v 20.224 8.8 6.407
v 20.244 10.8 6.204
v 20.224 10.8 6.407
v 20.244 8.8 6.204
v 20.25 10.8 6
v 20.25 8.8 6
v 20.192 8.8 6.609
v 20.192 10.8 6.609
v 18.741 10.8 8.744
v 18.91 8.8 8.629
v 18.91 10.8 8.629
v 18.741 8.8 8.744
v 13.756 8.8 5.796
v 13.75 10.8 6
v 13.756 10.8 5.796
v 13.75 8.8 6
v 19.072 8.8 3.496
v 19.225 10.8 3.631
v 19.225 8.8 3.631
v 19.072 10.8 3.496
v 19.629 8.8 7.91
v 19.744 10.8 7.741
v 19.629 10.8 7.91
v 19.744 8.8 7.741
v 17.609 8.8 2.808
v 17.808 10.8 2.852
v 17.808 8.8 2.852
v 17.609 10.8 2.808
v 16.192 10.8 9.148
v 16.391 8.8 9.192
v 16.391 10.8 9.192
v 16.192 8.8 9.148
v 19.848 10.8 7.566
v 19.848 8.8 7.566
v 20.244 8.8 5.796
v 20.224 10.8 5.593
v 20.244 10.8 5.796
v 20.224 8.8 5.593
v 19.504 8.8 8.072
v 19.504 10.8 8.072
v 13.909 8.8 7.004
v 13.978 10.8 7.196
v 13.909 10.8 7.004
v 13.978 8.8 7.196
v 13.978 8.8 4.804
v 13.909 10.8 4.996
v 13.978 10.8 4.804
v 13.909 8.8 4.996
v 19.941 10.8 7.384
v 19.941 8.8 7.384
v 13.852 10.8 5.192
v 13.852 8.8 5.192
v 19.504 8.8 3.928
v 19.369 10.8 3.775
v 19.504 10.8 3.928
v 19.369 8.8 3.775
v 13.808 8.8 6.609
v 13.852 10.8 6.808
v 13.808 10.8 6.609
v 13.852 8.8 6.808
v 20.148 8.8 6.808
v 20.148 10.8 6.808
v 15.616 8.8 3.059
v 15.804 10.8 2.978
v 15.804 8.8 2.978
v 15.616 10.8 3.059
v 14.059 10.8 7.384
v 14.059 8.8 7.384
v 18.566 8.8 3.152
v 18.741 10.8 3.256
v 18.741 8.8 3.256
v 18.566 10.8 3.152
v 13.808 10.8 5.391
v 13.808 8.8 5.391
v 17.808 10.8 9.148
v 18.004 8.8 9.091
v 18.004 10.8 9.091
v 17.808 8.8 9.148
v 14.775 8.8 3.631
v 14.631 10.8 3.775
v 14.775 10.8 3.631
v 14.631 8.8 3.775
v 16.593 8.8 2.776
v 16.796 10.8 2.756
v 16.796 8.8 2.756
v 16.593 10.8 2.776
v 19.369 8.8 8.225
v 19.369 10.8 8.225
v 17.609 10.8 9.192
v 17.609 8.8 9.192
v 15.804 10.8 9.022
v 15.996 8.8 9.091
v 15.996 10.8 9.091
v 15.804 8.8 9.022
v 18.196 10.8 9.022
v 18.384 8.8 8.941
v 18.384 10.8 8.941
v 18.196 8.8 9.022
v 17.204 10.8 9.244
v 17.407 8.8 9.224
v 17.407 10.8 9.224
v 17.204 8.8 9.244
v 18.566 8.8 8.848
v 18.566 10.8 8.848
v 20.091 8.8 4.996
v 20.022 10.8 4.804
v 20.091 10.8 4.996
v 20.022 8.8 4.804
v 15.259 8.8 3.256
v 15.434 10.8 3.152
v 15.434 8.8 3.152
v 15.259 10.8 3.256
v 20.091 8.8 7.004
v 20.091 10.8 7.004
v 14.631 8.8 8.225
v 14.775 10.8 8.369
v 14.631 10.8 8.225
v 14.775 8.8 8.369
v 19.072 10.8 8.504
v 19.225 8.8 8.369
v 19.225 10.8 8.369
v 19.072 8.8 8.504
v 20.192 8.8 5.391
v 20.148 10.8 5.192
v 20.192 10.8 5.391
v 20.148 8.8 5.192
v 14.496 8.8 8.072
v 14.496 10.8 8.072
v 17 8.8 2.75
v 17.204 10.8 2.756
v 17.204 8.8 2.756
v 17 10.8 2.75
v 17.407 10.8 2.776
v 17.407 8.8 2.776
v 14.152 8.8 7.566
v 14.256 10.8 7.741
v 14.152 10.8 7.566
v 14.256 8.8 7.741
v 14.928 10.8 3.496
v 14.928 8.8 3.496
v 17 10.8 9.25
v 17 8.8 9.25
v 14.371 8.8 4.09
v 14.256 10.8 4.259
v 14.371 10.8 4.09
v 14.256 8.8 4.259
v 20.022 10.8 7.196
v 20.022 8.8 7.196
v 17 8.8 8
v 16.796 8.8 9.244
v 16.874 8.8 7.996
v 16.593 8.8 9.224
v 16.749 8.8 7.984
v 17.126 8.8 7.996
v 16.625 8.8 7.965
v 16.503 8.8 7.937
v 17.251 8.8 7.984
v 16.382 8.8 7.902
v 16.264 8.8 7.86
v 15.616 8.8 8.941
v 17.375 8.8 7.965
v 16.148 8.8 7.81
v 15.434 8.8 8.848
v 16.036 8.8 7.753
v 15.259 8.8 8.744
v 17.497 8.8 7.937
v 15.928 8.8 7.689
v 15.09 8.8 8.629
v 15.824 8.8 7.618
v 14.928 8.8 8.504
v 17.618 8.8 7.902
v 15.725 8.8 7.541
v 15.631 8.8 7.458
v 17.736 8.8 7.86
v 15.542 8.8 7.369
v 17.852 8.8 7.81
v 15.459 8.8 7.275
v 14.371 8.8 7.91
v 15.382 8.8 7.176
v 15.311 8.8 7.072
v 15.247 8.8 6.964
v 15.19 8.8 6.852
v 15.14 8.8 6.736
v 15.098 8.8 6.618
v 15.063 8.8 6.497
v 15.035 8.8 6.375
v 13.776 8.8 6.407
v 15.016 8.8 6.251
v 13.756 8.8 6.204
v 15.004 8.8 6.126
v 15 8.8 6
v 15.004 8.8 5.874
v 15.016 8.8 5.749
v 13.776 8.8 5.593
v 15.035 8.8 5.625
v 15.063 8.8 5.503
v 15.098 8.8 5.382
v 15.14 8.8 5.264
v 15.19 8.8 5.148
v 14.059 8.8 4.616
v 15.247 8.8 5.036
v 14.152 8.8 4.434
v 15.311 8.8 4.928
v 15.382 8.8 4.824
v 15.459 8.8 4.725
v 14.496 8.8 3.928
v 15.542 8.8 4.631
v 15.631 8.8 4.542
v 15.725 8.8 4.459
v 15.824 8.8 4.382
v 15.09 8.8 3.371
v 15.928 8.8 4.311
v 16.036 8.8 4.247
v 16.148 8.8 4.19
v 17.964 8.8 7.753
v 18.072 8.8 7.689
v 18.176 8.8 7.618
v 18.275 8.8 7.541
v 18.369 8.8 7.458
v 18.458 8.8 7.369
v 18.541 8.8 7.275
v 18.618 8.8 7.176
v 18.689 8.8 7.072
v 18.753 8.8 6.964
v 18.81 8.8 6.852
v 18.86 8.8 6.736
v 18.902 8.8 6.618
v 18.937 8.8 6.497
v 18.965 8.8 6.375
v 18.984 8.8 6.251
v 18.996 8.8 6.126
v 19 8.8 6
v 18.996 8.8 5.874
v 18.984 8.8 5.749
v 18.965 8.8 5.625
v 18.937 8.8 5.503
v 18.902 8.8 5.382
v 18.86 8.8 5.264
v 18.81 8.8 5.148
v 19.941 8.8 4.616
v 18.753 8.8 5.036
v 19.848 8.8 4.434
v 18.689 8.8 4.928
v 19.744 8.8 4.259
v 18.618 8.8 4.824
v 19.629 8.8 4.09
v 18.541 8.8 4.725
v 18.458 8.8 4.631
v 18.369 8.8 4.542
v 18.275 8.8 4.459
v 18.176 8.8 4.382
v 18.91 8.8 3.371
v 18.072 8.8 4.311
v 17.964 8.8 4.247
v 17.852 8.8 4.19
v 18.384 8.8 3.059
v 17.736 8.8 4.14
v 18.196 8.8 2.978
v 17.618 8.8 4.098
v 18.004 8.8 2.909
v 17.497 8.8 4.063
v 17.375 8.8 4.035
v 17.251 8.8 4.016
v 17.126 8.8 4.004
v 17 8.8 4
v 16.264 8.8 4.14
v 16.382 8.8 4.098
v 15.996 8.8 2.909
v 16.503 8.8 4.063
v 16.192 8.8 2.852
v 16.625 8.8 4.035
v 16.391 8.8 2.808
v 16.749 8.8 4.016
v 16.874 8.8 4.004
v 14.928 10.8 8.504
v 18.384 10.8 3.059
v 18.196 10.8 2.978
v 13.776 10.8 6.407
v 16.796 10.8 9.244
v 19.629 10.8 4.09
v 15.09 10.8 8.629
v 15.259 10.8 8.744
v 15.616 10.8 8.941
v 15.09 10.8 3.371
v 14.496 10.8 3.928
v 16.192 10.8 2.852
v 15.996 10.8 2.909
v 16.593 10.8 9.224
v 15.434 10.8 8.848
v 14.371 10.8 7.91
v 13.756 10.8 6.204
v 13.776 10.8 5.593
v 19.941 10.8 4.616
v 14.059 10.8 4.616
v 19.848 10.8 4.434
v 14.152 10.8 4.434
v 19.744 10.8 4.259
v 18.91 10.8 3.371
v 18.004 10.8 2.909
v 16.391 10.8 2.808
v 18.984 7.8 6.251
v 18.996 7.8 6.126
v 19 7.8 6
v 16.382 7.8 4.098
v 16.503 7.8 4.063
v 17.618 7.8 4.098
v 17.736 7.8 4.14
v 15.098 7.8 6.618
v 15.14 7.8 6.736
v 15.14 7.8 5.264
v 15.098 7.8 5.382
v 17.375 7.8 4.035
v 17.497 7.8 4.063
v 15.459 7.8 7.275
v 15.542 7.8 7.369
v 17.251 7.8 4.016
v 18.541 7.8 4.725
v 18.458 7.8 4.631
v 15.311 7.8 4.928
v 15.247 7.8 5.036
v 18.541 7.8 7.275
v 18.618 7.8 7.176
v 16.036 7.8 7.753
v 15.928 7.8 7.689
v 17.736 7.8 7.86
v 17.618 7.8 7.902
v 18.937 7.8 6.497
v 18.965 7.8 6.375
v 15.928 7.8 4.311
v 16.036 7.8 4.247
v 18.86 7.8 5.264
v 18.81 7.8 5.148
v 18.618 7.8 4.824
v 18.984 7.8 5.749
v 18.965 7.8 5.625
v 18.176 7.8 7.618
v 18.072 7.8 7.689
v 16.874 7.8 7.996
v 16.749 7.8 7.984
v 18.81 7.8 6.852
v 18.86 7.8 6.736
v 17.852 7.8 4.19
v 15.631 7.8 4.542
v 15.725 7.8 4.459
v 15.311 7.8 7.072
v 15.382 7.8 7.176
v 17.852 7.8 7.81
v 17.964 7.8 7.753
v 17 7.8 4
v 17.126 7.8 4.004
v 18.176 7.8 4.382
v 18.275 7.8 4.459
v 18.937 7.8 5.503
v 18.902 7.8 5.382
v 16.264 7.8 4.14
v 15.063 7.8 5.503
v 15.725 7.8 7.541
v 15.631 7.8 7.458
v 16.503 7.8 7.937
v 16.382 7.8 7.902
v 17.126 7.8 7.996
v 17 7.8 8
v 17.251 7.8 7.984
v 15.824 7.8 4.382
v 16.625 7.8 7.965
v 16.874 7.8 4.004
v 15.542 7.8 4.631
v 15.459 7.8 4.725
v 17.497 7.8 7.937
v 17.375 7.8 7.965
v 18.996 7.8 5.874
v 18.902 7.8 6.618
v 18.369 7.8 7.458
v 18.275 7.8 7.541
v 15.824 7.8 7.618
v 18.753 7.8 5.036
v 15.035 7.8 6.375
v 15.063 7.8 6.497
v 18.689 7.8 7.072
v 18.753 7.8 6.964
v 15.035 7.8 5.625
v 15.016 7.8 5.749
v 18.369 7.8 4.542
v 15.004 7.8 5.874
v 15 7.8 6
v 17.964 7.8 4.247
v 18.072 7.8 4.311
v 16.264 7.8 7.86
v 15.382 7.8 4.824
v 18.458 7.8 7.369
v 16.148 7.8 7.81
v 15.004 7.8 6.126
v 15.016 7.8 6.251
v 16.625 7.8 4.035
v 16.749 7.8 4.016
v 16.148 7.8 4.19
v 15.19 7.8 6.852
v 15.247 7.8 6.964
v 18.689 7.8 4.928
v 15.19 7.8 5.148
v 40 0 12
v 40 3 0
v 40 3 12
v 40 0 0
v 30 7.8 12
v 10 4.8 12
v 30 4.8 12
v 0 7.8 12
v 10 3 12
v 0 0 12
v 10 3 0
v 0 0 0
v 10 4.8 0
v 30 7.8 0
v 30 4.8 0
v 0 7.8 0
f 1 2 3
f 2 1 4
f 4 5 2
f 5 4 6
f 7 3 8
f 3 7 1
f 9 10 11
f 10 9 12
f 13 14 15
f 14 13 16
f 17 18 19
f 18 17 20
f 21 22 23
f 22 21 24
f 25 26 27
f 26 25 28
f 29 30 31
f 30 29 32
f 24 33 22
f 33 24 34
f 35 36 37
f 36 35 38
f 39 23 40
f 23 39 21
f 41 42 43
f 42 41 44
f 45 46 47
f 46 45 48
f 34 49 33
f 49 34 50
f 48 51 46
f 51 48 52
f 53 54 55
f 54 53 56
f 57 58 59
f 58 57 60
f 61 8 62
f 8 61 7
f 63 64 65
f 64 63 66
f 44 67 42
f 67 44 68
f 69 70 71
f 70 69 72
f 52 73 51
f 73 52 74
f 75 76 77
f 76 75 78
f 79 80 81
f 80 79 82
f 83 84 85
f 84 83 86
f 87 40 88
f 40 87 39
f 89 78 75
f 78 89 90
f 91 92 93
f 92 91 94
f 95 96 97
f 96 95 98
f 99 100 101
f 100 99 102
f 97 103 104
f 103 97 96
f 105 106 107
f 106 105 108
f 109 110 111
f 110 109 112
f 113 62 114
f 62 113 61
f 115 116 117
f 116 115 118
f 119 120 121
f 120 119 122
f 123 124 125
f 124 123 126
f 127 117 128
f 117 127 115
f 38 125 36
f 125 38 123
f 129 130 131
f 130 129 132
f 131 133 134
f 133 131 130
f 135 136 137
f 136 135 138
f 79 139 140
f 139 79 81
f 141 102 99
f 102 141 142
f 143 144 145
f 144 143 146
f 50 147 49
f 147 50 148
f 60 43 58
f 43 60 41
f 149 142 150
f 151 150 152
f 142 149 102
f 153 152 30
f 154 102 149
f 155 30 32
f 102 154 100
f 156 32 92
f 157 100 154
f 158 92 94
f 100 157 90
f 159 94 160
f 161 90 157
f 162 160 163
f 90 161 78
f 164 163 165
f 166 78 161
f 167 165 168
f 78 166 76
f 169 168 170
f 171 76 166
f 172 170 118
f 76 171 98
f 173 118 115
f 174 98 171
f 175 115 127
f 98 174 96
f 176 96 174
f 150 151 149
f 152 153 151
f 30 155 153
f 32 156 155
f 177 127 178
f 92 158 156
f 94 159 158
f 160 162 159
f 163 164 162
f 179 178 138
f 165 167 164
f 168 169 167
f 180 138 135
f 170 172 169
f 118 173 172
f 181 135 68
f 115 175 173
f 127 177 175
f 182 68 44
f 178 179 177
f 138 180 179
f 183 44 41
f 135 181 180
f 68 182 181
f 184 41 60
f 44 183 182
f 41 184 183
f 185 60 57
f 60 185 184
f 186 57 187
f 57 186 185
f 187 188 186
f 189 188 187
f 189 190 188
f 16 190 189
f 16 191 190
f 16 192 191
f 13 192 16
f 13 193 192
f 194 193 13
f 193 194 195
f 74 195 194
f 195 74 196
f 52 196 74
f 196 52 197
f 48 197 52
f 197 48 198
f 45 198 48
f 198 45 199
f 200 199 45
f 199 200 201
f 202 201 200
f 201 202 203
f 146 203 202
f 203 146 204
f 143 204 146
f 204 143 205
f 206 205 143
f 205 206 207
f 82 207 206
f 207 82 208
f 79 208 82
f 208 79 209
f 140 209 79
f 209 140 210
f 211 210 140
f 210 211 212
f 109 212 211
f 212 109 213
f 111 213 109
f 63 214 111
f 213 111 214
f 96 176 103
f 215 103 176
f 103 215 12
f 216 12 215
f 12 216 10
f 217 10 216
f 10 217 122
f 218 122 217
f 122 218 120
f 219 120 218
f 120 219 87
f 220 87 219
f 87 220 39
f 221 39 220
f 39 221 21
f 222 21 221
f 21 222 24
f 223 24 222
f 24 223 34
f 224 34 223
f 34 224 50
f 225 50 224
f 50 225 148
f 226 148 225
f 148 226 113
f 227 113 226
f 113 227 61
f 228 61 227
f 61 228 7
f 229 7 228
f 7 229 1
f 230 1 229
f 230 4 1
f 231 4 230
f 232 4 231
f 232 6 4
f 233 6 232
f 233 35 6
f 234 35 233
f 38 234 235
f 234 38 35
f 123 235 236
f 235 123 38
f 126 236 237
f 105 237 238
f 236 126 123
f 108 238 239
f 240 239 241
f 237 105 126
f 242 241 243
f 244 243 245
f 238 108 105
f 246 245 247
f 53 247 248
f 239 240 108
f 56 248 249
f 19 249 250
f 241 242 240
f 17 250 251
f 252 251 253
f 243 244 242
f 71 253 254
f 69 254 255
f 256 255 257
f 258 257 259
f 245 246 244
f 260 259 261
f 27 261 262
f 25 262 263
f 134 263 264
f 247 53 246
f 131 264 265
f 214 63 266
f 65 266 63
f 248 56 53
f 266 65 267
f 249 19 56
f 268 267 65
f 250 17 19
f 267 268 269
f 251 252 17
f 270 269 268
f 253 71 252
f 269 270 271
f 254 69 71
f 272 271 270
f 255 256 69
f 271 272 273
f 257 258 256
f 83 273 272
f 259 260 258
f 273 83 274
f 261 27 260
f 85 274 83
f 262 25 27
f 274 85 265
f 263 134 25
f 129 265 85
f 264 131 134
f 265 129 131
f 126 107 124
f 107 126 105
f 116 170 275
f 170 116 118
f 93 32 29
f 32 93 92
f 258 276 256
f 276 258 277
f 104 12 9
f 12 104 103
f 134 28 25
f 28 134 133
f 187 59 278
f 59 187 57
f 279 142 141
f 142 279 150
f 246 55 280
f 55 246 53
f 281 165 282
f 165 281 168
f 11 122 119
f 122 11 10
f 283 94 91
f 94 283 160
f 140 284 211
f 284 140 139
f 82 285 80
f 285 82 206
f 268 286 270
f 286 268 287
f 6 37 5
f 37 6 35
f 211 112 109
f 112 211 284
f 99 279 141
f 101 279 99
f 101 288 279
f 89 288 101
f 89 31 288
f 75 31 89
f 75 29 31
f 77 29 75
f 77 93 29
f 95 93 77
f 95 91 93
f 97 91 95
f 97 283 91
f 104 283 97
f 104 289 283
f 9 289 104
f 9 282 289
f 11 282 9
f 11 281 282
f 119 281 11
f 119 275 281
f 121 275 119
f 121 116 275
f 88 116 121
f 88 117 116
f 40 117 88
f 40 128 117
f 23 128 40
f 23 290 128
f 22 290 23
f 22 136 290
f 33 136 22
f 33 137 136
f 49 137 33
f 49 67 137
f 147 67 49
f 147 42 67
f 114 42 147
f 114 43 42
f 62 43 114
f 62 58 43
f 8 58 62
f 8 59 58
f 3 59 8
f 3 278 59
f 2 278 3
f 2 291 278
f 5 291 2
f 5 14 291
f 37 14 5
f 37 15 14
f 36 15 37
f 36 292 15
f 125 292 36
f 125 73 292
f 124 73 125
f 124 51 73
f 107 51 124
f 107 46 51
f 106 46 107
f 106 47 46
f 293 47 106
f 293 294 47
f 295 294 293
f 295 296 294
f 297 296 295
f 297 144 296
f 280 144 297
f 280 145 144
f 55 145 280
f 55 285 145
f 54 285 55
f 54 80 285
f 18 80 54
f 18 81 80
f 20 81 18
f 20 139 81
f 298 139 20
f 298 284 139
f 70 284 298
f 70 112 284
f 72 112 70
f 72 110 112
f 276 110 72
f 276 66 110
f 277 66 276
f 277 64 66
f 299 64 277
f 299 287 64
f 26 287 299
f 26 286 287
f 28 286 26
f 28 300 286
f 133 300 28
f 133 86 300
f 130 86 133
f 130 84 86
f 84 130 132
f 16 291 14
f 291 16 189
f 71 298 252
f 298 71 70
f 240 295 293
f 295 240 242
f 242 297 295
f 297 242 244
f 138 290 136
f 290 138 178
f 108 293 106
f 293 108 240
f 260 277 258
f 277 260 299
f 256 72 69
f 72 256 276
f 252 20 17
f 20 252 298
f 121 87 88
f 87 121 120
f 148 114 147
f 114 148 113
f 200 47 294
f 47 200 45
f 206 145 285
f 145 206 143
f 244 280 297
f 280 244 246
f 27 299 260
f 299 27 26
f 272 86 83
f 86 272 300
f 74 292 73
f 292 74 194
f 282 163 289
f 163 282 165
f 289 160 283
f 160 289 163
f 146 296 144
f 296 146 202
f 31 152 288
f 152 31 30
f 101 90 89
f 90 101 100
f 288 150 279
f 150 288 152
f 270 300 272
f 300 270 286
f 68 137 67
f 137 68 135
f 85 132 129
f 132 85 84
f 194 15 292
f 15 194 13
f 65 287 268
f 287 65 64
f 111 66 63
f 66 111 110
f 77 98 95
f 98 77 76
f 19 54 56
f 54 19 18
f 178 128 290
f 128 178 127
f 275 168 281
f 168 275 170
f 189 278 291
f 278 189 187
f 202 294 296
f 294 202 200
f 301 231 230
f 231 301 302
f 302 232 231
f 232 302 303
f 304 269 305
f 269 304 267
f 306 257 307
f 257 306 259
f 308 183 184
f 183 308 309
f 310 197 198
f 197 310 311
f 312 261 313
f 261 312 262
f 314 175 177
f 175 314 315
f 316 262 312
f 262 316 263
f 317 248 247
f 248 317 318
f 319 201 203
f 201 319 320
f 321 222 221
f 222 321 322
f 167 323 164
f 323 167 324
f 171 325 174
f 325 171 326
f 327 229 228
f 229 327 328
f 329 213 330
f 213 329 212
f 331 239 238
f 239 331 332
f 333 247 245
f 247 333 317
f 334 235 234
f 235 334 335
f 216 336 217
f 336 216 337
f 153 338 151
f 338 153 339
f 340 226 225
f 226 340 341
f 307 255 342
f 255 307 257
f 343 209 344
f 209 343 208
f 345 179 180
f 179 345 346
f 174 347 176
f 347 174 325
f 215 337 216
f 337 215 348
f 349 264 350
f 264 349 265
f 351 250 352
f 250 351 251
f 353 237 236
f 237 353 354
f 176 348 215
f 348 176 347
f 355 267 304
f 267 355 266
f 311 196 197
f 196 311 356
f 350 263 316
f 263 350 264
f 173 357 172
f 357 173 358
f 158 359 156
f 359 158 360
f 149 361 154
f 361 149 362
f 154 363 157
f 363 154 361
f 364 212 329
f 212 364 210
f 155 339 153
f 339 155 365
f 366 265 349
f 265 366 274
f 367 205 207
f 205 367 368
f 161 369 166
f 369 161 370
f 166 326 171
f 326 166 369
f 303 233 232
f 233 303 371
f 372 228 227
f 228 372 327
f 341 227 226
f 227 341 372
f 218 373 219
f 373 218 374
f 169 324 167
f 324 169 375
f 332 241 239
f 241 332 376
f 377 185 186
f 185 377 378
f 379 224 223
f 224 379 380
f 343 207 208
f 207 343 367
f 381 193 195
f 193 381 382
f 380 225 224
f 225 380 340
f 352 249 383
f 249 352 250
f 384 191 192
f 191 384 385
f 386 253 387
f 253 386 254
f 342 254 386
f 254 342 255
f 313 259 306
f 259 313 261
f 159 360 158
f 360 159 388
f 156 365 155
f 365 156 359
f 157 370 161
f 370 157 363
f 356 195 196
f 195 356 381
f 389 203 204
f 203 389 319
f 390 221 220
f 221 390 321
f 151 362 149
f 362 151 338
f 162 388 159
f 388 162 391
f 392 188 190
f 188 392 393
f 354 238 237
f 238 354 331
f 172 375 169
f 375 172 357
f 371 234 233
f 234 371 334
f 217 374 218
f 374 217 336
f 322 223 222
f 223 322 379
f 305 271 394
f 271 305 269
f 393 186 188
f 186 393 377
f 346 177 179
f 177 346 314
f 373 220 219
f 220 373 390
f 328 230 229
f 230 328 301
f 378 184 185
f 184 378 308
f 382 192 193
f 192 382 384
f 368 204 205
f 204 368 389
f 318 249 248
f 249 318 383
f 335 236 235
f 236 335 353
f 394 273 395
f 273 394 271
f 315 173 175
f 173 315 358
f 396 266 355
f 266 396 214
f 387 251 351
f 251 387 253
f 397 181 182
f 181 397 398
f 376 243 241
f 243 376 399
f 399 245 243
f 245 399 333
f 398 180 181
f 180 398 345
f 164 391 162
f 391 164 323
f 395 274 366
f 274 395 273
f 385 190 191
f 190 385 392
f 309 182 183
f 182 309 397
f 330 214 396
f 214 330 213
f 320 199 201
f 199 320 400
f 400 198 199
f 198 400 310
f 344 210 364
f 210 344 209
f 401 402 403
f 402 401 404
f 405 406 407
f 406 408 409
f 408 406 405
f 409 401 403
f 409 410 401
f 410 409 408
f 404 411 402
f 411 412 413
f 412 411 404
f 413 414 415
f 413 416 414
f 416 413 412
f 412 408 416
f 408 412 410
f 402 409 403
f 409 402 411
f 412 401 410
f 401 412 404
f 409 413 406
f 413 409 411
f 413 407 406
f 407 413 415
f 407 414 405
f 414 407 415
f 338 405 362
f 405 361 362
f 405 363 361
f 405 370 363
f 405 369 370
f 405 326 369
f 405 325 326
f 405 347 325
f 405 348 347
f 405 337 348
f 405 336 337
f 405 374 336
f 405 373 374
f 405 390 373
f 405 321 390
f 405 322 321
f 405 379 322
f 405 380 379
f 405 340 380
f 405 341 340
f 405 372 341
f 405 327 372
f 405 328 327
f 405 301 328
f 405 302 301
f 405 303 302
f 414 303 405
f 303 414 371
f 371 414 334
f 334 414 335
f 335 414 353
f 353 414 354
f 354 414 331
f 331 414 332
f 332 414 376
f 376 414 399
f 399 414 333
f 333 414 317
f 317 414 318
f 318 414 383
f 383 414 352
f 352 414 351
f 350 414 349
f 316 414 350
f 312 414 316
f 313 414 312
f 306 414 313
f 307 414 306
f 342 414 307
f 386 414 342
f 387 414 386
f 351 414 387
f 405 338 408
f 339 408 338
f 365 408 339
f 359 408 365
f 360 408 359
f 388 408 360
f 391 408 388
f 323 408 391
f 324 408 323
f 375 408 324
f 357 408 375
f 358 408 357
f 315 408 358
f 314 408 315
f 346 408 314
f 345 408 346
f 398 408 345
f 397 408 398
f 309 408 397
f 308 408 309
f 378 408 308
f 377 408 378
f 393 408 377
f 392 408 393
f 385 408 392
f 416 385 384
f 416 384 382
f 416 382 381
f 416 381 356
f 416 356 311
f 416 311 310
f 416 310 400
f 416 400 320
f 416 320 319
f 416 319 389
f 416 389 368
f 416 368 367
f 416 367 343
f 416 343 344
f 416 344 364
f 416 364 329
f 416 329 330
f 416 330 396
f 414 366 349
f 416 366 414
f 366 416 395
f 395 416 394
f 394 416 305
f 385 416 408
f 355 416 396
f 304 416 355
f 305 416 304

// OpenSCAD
width=12;

backdepth=3;
backhang=40;

backwidth=1.8;

union() {
    
color("yellow") {
  cube([backhang, backdepth, width]);
}

translate([0, backdepth, 0]) {
  color("blue") {
    cube([10, backwidth, width]);
  }
}

fronthang=30;

translate([0, backdepth+backwidth, 0]) {
  color("red") {
    cube([fronthang, backdepth, width]);
  }
}

cap_radius = 6.5 / 2;
shaft_radius = 4 / 2;
cap_position = backdepth + backwidth + backdepth + backdepth + 0;

color("green") {
    translate([fronthang - cap_radius * 4, cap_position, width/2 ]) {
        rotate([90, 0, 0]) {
            union() {
                cylinder(h=2, r1=cap_radius , r2=cap_radius, center=false, $fn=100);
                cylinder(h=3.5, r1=shaft_radius, r2=shaft_radius, center=false, $fn=100);
            }
        }
    }
}

}
